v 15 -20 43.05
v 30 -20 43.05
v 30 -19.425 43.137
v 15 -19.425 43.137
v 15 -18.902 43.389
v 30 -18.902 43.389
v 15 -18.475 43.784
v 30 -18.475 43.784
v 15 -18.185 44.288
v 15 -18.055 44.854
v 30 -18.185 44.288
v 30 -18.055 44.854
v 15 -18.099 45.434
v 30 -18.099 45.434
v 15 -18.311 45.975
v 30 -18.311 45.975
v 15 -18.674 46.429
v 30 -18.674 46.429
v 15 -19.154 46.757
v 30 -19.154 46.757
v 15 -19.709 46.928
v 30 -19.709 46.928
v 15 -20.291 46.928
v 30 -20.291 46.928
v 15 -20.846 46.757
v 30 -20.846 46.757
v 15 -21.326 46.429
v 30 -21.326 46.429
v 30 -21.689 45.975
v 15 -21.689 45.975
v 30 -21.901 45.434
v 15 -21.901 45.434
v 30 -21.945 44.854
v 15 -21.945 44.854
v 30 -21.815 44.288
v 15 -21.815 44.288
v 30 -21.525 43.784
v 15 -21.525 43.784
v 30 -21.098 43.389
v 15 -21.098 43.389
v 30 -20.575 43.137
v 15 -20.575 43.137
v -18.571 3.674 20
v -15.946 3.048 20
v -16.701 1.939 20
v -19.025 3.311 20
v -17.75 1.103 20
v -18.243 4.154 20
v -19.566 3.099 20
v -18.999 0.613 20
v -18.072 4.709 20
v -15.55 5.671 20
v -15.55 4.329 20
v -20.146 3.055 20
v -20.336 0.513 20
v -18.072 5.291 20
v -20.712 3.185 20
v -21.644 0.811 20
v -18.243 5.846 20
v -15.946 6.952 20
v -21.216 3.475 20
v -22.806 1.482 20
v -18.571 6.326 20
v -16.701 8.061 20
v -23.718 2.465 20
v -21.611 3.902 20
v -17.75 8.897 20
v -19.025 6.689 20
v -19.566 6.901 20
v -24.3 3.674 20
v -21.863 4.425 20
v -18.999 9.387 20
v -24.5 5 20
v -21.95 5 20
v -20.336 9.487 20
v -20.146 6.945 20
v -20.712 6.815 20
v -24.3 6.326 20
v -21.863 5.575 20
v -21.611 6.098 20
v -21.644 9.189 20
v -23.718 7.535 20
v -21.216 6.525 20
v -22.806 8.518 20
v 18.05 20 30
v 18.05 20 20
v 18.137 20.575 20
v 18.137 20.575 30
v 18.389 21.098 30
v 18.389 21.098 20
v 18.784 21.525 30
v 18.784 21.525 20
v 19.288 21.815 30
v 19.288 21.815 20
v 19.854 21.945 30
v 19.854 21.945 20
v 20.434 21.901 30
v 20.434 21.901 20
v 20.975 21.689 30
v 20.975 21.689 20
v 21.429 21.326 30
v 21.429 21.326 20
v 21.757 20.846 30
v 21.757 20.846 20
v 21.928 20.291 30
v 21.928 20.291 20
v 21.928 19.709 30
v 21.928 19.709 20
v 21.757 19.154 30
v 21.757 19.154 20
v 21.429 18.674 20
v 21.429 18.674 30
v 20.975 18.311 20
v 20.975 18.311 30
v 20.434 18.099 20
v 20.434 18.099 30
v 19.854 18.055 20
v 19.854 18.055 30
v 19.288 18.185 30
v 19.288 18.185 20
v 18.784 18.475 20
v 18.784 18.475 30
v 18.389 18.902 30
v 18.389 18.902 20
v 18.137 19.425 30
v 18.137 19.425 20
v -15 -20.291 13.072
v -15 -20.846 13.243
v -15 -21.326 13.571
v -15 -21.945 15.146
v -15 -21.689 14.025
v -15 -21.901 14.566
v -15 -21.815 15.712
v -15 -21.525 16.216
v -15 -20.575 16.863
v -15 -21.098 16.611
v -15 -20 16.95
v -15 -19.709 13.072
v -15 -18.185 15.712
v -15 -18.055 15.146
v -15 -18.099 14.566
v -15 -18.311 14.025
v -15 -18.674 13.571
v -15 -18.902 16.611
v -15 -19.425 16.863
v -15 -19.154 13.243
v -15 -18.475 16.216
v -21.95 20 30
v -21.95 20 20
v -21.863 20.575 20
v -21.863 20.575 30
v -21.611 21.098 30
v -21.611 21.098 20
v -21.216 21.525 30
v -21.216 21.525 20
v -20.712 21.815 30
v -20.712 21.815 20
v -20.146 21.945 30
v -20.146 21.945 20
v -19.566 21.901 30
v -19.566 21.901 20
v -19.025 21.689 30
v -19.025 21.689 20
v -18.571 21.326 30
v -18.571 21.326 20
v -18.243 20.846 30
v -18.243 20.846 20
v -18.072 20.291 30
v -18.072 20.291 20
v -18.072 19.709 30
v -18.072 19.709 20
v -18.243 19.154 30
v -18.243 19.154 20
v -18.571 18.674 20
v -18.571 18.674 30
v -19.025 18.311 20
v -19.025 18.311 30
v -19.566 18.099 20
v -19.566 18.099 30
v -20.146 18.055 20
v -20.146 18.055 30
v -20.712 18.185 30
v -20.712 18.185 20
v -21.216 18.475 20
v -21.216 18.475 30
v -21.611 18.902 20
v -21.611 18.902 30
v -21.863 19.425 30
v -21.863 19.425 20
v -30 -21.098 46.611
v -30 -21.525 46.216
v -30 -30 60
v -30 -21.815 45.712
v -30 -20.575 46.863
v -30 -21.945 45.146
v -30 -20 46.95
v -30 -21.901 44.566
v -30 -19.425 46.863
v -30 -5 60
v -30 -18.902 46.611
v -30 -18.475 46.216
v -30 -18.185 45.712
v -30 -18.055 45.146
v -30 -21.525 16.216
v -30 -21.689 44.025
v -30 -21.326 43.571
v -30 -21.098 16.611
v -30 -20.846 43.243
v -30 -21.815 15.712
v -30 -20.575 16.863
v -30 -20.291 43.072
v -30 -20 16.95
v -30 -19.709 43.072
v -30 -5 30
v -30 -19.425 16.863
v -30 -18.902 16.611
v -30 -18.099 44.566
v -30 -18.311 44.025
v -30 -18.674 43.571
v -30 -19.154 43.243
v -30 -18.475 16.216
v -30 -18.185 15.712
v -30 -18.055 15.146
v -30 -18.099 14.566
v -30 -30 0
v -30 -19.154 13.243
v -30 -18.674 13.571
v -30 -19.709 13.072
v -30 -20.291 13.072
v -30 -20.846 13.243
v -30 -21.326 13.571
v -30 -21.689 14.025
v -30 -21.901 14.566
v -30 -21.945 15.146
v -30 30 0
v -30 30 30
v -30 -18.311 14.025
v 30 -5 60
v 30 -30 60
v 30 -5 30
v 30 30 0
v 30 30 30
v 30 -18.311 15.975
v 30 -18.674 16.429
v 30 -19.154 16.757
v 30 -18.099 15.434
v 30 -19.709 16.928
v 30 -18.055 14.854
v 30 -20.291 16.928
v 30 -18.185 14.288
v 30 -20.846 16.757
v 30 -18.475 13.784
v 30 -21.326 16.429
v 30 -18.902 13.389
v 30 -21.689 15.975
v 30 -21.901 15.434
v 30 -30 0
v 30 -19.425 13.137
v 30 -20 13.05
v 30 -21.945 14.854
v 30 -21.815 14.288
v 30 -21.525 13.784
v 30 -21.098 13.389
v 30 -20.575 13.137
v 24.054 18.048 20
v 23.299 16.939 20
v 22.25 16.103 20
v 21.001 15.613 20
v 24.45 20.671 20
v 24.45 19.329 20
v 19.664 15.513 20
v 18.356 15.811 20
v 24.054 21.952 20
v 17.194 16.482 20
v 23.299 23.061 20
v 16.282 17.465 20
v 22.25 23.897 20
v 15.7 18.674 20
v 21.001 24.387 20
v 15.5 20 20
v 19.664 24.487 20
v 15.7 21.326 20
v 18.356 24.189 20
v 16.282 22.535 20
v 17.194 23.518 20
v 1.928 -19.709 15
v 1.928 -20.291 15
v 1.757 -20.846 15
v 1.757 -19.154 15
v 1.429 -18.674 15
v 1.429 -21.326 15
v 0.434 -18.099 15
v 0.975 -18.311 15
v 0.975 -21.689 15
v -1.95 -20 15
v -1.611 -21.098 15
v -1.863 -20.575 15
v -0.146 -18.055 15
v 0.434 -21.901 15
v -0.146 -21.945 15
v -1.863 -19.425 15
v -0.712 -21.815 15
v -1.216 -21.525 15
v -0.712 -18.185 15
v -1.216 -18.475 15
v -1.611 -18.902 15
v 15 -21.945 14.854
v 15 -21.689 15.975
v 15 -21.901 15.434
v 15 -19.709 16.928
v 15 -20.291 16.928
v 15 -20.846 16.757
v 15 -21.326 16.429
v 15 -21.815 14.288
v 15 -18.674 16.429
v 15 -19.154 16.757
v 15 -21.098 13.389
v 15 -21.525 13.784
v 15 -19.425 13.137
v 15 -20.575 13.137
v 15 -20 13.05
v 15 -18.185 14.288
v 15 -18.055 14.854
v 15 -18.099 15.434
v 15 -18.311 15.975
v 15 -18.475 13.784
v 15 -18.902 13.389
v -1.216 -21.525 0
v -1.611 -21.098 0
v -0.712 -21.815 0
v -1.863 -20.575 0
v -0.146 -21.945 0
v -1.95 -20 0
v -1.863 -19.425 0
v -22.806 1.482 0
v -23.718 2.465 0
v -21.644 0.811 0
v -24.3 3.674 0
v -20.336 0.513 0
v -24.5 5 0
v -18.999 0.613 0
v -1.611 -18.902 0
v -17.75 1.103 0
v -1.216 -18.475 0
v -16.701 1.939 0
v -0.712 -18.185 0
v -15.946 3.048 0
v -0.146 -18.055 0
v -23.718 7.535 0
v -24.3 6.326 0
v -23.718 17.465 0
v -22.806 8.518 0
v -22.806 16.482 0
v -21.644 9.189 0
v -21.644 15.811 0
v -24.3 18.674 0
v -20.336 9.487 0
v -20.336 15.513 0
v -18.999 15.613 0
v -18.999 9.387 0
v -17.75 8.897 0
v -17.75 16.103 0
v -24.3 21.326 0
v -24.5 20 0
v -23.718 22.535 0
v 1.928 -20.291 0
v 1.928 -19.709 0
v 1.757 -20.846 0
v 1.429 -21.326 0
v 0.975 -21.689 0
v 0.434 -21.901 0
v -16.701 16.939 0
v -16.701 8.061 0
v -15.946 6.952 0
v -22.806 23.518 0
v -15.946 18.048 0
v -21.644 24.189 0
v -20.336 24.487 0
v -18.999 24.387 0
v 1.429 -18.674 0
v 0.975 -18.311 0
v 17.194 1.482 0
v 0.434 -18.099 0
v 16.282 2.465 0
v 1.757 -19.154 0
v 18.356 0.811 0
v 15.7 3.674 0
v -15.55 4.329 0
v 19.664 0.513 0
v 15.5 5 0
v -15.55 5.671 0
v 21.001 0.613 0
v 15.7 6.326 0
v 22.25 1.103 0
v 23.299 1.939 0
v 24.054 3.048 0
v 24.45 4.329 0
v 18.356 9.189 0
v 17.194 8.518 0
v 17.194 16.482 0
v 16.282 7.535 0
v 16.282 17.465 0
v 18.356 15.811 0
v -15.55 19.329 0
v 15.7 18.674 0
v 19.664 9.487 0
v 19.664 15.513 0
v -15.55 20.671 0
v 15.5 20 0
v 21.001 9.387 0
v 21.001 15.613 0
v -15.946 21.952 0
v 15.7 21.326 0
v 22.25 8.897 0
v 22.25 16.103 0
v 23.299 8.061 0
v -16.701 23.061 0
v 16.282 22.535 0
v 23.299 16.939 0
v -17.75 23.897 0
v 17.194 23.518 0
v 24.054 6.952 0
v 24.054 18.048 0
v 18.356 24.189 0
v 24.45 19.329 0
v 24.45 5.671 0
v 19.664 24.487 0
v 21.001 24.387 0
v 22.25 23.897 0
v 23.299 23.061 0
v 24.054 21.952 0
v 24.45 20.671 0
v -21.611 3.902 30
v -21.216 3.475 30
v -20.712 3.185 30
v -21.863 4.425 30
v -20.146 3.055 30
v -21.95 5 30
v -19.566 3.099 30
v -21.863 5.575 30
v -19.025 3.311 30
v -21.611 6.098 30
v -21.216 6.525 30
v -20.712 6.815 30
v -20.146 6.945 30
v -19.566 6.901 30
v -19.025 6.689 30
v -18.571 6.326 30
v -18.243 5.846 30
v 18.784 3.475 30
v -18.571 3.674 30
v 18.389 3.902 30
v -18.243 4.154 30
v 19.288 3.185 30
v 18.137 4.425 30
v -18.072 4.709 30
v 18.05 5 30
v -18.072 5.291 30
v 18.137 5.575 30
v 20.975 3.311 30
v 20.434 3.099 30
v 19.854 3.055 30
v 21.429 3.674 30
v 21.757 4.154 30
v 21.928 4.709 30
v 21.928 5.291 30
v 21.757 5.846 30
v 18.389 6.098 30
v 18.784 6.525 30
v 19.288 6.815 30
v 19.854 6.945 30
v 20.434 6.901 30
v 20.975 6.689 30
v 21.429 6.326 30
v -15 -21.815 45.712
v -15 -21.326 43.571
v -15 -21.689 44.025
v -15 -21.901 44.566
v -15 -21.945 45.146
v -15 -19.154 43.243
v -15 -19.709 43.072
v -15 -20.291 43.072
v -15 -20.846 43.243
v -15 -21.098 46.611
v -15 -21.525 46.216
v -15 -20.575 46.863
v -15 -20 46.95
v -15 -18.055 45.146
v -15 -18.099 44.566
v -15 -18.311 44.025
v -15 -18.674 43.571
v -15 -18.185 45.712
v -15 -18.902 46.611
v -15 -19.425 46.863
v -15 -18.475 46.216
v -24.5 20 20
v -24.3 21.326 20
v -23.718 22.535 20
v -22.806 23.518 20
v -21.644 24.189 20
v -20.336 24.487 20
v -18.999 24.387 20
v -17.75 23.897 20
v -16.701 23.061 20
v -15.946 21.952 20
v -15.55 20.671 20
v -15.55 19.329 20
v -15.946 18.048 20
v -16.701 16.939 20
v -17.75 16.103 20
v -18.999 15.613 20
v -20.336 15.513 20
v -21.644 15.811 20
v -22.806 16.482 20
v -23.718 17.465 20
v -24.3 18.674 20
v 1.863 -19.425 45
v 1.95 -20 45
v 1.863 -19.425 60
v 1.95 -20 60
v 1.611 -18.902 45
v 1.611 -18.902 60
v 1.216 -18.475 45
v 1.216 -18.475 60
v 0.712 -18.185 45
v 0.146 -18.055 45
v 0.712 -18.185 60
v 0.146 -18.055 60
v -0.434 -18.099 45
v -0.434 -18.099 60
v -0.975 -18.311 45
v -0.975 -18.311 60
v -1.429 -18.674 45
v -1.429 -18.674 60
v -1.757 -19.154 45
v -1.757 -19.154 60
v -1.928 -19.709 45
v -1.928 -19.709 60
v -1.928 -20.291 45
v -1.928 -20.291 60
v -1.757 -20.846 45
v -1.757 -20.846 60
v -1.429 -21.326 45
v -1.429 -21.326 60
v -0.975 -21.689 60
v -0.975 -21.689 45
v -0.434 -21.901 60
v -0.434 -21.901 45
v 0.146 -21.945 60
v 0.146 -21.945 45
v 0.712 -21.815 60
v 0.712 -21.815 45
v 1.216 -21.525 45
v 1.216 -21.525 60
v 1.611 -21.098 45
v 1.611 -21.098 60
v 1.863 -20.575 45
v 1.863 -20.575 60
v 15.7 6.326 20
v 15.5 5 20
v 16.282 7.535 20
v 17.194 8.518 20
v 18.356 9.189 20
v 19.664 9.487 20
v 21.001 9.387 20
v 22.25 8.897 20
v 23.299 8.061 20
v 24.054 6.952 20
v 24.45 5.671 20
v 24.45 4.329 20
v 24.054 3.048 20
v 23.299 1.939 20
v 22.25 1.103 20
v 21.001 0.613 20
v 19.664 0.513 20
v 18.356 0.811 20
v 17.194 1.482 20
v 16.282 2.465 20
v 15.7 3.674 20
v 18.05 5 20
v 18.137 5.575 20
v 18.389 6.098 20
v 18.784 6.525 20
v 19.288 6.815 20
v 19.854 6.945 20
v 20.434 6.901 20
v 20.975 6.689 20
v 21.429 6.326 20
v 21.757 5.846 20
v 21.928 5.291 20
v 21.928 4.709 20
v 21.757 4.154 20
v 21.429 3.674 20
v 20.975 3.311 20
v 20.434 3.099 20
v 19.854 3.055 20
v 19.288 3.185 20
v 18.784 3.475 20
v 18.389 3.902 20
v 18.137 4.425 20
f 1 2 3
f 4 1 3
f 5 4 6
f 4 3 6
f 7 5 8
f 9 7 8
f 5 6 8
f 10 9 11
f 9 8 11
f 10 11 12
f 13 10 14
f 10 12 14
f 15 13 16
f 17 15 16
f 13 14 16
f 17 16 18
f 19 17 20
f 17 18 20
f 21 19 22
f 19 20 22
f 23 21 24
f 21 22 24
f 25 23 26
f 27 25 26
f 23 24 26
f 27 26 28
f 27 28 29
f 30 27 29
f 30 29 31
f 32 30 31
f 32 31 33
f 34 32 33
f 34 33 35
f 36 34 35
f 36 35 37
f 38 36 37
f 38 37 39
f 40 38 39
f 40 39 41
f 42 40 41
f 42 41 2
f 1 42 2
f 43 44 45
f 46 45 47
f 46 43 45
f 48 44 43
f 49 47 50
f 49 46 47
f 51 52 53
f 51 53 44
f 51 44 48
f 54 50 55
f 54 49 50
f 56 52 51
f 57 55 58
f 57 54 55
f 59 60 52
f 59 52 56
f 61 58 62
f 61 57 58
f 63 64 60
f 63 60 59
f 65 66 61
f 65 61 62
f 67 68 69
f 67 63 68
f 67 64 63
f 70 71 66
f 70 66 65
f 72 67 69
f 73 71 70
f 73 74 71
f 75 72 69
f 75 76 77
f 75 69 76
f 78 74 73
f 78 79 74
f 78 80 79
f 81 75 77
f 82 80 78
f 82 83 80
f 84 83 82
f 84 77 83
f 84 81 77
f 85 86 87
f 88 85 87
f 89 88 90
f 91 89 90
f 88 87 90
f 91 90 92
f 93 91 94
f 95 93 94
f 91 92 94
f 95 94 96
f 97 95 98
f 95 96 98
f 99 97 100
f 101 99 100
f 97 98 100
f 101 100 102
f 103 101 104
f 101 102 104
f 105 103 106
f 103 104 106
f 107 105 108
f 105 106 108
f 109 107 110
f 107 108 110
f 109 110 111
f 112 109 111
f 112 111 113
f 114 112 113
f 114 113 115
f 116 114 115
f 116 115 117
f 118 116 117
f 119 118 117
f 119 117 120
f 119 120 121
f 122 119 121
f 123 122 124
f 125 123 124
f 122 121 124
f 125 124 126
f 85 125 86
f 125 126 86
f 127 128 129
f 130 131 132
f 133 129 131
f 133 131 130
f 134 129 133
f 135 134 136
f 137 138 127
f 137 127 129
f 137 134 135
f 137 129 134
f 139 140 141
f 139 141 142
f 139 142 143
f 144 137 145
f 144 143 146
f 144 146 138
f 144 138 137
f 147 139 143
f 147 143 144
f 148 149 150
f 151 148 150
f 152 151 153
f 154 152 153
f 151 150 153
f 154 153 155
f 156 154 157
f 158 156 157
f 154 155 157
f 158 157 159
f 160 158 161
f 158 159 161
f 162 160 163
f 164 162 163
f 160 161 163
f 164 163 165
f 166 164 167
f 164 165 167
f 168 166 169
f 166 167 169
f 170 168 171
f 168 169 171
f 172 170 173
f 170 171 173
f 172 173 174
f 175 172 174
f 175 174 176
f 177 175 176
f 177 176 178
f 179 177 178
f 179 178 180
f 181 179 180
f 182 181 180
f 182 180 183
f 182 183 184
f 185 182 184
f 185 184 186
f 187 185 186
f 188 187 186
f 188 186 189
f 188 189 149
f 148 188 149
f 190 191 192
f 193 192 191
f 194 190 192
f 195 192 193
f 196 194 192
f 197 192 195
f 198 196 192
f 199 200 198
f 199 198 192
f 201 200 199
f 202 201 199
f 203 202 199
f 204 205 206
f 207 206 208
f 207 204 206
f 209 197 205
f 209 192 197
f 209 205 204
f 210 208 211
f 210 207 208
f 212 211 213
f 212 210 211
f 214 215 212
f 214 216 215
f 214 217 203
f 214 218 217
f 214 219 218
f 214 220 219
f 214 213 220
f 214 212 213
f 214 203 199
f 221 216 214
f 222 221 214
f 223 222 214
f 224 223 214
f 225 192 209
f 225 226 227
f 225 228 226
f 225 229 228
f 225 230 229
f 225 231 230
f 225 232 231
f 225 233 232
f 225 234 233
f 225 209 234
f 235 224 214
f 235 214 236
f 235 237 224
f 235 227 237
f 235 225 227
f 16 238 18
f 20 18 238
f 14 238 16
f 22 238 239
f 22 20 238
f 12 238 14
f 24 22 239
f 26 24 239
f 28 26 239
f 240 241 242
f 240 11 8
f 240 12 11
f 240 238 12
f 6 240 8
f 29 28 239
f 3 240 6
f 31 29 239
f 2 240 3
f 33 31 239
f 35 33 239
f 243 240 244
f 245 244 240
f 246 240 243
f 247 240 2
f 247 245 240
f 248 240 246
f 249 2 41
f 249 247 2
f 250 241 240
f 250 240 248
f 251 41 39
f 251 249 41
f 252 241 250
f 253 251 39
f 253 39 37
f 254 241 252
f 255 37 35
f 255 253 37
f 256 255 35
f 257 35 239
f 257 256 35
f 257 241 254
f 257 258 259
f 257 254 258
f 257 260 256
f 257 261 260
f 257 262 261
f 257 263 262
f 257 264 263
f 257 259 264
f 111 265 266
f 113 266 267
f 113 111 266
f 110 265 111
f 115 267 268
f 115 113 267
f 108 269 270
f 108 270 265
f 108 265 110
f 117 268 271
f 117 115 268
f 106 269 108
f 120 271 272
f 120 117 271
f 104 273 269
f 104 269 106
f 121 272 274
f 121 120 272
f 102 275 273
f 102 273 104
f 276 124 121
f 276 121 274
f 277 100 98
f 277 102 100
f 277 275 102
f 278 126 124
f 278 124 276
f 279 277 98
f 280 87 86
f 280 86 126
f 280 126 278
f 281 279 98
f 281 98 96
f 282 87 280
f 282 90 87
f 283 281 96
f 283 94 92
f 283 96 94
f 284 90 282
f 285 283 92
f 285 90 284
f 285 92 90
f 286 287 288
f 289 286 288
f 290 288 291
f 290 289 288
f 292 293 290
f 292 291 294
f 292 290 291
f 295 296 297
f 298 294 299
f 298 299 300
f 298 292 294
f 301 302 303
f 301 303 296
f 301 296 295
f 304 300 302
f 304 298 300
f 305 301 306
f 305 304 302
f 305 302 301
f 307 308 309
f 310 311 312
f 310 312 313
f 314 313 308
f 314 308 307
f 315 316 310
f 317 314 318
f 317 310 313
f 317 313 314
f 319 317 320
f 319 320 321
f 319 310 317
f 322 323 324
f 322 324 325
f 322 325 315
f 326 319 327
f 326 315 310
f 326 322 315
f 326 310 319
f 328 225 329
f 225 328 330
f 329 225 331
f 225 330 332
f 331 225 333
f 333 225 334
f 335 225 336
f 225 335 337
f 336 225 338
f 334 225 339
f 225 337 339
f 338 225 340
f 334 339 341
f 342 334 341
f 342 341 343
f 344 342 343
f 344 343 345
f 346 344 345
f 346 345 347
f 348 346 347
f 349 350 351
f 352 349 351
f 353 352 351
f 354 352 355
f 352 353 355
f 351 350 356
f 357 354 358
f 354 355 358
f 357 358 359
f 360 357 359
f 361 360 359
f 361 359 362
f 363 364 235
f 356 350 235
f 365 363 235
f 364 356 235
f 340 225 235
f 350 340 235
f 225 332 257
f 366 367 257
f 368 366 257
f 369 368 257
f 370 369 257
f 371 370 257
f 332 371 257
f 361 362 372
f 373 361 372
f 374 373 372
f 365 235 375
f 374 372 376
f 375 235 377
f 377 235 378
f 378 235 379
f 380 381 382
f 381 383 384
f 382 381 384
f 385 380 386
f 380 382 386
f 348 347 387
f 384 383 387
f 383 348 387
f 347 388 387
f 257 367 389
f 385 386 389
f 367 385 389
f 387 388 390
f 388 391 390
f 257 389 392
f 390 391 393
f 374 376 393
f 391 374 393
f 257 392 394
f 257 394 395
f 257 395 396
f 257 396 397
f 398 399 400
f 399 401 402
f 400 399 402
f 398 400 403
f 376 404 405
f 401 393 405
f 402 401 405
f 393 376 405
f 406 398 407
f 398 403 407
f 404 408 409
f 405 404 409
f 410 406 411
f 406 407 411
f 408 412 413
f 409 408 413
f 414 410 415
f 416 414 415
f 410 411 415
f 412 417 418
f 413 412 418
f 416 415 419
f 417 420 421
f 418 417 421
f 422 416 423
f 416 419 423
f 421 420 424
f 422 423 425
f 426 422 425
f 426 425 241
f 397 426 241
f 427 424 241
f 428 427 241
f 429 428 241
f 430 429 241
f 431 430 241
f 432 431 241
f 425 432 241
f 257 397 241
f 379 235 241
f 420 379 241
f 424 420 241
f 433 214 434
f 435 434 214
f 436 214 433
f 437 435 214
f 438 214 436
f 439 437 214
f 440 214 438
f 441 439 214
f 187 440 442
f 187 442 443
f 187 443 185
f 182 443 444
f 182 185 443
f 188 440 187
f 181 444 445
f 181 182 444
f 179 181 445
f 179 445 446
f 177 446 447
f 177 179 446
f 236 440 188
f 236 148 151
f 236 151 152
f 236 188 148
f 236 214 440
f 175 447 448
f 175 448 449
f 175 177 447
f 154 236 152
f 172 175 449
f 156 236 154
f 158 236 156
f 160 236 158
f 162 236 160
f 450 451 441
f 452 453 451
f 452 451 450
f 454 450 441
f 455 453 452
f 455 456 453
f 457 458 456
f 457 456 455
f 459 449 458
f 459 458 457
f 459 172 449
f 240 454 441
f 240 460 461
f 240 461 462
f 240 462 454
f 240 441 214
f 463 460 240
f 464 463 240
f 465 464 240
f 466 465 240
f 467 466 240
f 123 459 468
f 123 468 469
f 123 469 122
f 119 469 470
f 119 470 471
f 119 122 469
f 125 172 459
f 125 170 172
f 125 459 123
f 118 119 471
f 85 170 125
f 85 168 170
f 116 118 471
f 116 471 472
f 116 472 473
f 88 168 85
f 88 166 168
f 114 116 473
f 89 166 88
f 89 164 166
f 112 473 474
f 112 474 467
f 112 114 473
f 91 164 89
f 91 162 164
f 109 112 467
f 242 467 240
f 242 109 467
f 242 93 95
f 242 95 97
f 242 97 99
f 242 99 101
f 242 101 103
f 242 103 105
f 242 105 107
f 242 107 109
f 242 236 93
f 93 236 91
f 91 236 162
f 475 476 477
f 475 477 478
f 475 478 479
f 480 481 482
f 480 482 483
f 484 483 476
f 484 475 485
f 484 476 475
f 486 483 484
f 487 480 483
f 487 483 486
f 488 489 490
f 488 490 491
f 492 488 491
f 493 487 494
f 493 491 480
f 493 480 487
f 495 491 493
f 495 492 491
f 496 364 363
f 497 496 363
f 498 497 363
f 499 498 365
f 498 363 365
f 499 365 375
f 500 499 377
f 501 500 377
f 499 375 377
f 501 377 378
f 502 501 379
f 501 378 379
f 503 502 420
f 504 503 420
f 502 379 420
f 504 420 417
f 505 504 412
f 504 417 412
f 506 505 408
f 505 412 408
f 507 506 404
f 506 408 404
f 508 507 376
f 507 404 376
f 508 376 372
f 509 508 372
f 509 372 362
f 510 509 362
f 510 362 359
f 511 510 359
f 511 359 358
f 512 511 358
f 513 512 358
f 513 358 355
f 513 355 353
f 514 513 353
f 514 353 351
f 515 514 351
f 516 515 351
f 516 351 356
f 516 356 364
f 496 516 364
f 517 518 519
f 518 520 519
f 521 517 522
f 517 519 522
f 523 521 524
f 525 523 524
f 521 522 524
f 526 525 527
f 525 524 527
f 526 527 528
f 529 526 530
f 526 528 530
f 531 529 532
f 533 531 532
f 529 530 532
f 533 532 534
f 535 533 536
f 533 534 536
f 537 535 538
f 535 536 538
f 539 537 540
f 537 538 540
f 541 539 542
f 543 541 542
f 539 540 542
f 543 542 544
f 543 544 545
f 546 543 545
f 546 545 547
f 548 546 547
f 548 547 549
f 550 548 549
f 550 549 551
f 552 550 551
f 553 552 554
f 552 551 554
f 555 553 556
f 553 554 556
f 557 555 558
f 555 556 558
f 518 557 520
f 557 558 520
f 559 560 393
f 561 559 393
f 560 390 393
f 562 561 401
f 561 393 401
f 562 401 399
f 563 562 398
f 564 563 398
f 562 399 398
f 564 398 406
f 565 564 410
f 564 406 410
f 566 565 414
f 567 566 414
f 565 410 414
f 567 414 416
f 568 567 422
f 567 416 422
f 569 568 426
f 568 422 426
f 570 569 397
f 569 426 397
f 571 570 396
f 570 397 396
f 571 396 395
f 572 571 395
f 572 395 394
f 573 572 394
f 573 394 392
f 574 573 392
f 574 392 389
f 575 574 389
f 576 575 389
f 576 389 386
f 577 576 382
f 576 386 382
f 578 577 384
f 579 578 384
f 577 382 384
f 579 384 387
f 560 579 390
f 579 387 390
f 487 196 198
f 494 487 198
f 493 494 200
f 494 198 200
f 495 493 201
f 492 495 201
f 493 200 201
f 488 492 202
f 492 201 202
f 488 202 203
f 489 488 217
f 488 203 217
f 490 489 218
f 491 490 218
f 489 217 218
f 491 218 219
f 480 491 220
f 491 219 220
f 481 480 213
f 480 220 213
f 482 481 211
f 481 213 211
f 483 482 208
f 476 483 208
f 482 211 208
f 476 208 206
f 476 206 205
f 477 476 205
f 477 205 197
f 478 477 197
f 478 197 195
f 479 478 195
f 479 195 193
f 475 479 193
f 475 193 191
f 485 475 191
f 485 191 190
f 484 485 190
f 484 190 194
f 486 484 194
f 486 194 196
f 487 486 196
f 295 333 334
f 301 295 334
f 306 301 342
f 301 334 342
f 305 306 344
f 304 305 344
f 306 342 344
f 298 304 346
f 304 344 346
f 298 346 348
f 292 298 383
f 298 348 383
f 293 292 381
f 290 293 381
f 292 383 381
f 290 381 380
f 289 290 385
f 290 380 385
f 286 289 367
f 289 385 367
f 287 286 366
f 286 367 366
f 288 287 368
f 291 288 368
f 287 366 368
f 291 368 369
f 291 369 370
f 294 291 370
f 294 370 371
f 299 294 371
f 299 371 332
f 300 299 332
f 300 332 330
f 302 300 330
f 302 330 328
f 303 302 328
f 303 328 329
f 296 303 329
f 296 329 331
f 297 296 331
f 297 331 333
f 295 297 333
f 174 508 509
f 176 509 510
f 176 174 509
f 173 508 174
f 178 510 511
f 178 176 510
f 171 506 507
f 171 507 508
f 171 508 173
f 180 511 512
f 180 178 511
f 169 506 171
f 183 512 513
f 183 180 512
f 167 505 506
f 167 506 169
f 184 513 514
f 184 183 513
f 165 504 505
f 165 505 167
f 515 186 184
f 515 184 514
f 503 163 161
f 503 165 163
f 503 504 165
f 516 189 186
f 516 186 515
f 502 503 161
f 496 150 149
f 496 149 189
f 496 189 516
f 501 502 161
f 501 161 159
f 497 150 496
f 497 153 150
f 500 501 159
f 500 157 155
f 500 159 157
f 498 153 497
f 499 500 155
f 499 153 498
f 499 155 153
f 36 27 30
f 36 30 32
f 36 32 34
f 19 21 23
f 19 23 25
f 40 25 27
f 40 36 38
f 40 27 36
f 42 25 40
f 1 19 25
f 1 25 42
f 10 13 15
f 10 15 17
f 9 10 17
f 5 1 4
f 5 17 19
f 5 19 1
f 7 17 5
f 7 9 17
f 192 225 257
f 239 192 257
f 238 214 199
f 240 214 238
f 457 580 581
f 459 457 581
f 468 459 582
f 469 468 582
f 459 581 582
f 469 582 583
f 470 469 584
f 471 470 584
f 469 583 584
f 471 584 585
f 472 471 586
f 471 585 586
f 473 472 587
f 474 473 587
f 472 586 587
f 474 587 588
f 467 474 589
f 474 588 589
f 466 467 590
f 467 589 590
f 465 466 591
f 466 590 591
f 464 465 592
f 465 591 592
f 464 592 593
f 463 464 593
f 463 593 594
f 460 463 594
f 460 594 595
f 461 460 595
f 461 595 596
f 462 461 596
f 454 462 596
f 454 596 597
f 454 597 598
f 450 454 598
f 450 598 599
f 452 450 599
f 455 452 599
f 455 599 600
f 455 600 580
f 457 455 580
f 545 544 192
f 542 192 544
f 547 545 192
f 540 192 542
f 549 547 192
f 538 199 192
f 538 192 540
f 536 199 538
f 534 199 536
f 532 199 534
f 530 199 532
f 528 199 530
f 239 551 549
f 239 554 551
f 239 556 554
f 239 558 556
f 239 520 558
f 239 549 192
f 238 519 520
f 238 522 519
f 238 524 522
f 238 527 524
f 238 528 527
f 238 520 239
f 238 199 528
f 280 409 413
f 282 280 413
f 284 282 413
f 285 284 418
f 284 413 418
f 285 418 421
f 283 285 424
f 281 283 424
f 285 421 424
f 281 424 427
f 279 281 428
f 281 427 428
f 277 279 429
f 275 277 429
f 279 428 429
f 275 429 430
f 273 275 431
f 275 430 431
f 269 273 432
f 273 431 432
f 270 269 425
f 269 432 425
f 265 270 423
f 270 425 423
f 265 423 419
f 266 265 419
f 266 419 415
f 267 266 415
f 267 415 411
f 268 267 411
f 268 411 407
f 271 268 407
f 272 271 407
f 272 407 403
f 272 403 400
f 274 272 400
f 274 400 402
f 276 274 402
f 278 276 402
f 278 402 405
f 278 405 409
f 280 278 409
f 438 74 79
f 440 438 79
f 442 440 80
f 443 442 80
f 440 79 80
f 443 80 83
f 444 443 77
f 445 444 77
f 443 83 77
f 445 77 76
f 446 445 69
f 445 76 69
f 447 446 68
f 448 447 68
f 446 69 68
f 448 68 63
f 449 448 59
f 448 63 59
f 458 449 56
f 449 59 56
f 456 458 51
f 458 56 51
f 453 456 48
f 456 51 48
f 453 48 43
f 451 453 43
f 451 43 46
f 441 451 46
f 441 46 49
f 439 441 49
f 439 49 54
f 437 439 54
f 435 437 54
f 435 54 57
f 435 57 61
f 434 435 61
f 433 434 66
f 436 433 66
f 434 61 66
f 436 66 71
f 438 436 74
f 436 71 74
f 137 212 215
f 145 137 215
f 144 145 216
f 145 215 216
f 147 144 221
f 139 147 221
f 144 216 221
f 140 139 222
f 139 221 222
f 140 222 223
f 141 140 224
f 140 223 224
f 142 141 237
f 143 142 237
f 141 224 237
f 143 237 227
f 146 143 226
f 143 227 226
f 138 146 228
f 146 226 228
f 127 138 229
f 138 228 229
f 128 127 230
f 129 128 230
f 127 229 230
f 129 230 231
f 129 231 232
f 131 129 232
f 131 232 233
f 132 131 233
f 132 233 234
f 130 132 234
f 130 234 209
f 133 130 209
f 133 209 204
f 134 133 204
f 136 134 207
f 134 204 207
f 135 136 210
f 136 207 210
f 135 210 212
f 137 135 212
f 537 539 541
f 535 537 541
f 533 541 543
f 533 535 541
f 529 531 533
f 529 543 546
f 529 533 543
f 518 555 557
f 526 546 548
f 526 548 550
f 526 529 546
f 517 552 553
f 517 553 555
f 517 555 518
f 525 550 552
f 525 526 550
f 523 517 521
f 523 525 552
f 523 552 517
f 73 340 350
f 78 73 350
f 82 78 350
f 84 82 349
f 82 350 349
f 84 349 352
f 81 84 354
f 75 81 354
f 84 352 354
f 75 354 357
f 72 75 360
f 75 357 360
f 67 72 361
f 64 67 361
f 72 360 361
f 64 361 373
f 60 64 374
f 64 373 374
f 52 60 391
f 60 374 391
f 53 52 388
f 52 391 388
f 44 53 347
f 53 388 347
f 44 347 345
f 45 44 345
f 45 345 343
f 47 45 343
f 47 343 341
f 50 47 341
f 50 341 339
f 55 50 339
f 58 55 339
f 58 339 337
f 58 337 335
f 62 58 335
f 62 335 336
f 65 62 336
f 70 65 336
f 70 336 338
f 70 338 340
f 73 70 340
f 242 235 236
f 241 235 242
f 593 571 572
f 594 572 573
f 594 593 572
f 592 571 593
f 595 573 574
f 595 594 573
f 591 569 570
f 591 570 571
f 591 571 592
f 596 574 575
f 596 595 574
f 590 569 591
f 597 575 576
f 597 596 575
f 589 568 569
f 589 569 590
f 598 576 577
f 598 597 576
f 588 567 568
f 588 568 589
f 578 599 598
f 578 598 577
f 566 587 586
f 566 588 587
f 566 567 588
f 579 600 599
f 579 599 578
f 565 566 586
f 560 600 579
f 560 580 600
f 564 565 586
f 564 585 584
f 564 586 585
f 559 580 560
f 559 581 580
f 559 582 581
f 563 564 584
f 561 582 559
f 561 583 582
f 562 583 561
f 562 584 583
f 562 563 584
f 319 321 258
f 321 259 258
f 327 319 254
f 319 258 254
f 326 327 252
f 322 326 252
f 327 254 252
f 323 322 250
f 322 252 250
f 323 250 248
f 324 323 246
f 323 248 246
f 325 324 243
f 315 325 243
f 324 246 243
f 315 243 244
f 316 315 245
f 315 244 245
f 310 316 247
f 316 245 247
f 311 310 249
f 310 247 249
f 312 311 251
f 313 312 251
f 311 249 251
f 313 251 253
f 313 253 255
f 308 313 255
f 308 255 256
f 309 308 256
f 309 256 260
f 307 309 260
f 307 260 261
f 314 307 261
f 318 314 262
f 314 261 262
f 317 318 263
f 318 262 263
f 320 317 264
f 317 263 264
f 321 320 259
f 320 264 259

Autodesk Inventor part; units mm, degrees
ref_plane "YZ Plane" through (0, 0, 0) normal (1, 0, 0) x (0, 1, 0)
ref_plane "XZ Plane" through (0, 0, 0) normal (0, 1, 0) x (-1, 0, 0)
ref_plane "XY Plane" through (0, 0, 0) normal (0, 0, 1) x (1, 0, 0)
sketch "Sketch1" plane through (0, 0, 0) normal (0, 0, 1) x (1, 0, 0)
  line L0 (-30, 30) -> (30, 30)
  line L1 (30, 30) -> (30, -30)
  line L2 (30, -30) -> (-30, -30)
  line L3 (-30, -30) -> (-30, 30)
  point P0 (0, 0)
  dimension "d0" = 60
  dimension "d1" = 60
  dimension "d2" = 30
  dimension "d3" = 30
extrude "Extrusion1" add sketch "Sketch1" along normal blind 10
sketch "Sketch2" plane through (0, 0, 10) normal (0, 0, 1) x (1, 0, 0)
  line L0 (30, 30) -> (-30, 30) projected
  line L1 (30, -30) -> (30, 30) projected
  line L2 (-30, 30) -> (30, 30)
  line L3 (30, 30) -> (30, -5)
  line L4 (30, -5) -> (-30, -5)
  line L5 (-30, -5) -> (-30, 30)
  point P0 (0, 0)
  dimension "d6" = 35
extrude "Extrusion2" add sketch "Sketch2" along normal blind 20
sketch "Sketch3" plane through (0, 0, 10) normal (0, 0, 1) x (1, 0, 0)
  line L0 (-30, -5) -> (30, -5) projected
  line L1 (-30, -30) -> (30, -30) projected
  line L2 (-30, -5) -> (30, -5)
  line L3 (30, -5) -> (30, -30)
  line L4 (30, -30) -> (-30, -30)
  line L5 (-30, -30) -> (-30, -5)
  point P0 (0, 0)
extrude "Extrusion3" add sketch "Sketch3" along normal blind 50
sketch "Sketch4" plane through (0, 0, 0) normal (0, 0, -1) x (-1, 0, 0)
  circle A0 centre (-20, 20) radius 1.95
  circle A1 centre (20, 20) radius 1.95
  circle A2 centre (20, 5) radius 1.95
  circle A3 centre (-20, 5) radius 1.95
  line L0 (-30, 30) -> (30, 30) projected
  line L1 (-30, -30) -> (-30, 30) projected
  line L2 (30, 30) -> (30, -30) projected
  point P0 (0, 0)
  dimension "d11" = 10
  dimension "d12" = 10
  dimension "d13" = 10
  dimension "d14" = 10
  dimension "d15" = 10
  dimension "d16" = 25
  dimension "d17" = 25
  dimension "d18" = 10
  dimension "d19" = 3.9
  dimension "d20" = 3.9
  dimension "d21" = 3.9
  dimension "d22" = 3.9
extrude "Extrusion4" cut sketch "Sketch4" against normal blind 30
sketch "Sketch5" plane through (0, 0, 0) normal (0, 0, -1) x (-1, 0, 0)
  circle A0 centre (-20, 20) radius 1.95 projected
  circle A1 centre (-20, 20) radius 4.5
  circle A2 centre (-20, 5) radius 1.95 projected
  circle A3 centre (-20, 5) radius 4.5
  circle A4 centre (20, 20) radius 1.95 projected
  circle A5 centre (20, 20) radius 4.5
  circle A6 centre (20, 5) radius 1.95 projected
  circle A7 centre (20, 5) radius 4.5
  point P0 (0, 0)
  dimension "d25" = 9
  dimension "d26" = 9
  dimension "d27" = 9
  dimension "d28" = 9
extrude "Extrusion5" cut sketch "Sketch5" against normal blind 20
sketch "Sketch6" plane through (-30, -30, 0) normal (-1, 0, 0) x (0, 0, 1)
  circle A0 centre (15, 10) radius 1.95
  circle A1 centre (45, 10) radius 1.95
  line L0 (0, 60) -> (0, 0) projected
  line L1 (0, 0) -> (60, 0) projected
  line L2 (60, 25) -> (60, 0) projected
  point P0 (0, 30)
  dimension "d31" = 15
  dimension "d32" = 10
  dimension "d33" = 15
  dimension "d34" = 10
  dimension "d35" = 3.9
  dimension "d36" = 3.9
extrude "Extrusion6" cut sketch "Sketch6" against normal blind 15
sketch "Sketch7" plane through (30, -30, 0) normal (1, 0, 0) x (0, 0, -1)
  circle A0 centre (-45, 10) radius 1.95 projected
  circle A1 centre (-45, 10) radius 1.95
  circle A2 centre (-15, 10) radius 1.95 projected
  circle A3 centre (-15, 10) radius 1.95
  point P0 (0, 30)
extrude "Extrusion7" cut sketch "Sketch7" against normal blind 15
sketch "Sketch8" plane through (0, 0, 0) normal (0, 0, -1) x (-1, 0, 0)
  circle A0 centre (0, -20) radius 1.95
  line L0 (30, -30) -> (-30, -30) projected
  line L1 (-30, -30) -> (-30, 30) projected
  point P0 (0, 0)
  dimension "d41" = 10
  dimension "d42" = 30
  dimension "d43" = 3.9
extrude "Extrusion8" cut sketch "Sketch8" against normal blind 15
sketch "Sketch9" plane through (0, 0, 60) normal (0, 0, 1) x (1, 0, 0)
  circle A0 centre (0, -20) radius 1.95 projected
  circle A1 centre (0, -20) radius 1.95
  point P0 (0, 0)
extrude "Extrusion9" cut sketch "Sketch9" against normal blind 15
properties part number "Base_V2b"
